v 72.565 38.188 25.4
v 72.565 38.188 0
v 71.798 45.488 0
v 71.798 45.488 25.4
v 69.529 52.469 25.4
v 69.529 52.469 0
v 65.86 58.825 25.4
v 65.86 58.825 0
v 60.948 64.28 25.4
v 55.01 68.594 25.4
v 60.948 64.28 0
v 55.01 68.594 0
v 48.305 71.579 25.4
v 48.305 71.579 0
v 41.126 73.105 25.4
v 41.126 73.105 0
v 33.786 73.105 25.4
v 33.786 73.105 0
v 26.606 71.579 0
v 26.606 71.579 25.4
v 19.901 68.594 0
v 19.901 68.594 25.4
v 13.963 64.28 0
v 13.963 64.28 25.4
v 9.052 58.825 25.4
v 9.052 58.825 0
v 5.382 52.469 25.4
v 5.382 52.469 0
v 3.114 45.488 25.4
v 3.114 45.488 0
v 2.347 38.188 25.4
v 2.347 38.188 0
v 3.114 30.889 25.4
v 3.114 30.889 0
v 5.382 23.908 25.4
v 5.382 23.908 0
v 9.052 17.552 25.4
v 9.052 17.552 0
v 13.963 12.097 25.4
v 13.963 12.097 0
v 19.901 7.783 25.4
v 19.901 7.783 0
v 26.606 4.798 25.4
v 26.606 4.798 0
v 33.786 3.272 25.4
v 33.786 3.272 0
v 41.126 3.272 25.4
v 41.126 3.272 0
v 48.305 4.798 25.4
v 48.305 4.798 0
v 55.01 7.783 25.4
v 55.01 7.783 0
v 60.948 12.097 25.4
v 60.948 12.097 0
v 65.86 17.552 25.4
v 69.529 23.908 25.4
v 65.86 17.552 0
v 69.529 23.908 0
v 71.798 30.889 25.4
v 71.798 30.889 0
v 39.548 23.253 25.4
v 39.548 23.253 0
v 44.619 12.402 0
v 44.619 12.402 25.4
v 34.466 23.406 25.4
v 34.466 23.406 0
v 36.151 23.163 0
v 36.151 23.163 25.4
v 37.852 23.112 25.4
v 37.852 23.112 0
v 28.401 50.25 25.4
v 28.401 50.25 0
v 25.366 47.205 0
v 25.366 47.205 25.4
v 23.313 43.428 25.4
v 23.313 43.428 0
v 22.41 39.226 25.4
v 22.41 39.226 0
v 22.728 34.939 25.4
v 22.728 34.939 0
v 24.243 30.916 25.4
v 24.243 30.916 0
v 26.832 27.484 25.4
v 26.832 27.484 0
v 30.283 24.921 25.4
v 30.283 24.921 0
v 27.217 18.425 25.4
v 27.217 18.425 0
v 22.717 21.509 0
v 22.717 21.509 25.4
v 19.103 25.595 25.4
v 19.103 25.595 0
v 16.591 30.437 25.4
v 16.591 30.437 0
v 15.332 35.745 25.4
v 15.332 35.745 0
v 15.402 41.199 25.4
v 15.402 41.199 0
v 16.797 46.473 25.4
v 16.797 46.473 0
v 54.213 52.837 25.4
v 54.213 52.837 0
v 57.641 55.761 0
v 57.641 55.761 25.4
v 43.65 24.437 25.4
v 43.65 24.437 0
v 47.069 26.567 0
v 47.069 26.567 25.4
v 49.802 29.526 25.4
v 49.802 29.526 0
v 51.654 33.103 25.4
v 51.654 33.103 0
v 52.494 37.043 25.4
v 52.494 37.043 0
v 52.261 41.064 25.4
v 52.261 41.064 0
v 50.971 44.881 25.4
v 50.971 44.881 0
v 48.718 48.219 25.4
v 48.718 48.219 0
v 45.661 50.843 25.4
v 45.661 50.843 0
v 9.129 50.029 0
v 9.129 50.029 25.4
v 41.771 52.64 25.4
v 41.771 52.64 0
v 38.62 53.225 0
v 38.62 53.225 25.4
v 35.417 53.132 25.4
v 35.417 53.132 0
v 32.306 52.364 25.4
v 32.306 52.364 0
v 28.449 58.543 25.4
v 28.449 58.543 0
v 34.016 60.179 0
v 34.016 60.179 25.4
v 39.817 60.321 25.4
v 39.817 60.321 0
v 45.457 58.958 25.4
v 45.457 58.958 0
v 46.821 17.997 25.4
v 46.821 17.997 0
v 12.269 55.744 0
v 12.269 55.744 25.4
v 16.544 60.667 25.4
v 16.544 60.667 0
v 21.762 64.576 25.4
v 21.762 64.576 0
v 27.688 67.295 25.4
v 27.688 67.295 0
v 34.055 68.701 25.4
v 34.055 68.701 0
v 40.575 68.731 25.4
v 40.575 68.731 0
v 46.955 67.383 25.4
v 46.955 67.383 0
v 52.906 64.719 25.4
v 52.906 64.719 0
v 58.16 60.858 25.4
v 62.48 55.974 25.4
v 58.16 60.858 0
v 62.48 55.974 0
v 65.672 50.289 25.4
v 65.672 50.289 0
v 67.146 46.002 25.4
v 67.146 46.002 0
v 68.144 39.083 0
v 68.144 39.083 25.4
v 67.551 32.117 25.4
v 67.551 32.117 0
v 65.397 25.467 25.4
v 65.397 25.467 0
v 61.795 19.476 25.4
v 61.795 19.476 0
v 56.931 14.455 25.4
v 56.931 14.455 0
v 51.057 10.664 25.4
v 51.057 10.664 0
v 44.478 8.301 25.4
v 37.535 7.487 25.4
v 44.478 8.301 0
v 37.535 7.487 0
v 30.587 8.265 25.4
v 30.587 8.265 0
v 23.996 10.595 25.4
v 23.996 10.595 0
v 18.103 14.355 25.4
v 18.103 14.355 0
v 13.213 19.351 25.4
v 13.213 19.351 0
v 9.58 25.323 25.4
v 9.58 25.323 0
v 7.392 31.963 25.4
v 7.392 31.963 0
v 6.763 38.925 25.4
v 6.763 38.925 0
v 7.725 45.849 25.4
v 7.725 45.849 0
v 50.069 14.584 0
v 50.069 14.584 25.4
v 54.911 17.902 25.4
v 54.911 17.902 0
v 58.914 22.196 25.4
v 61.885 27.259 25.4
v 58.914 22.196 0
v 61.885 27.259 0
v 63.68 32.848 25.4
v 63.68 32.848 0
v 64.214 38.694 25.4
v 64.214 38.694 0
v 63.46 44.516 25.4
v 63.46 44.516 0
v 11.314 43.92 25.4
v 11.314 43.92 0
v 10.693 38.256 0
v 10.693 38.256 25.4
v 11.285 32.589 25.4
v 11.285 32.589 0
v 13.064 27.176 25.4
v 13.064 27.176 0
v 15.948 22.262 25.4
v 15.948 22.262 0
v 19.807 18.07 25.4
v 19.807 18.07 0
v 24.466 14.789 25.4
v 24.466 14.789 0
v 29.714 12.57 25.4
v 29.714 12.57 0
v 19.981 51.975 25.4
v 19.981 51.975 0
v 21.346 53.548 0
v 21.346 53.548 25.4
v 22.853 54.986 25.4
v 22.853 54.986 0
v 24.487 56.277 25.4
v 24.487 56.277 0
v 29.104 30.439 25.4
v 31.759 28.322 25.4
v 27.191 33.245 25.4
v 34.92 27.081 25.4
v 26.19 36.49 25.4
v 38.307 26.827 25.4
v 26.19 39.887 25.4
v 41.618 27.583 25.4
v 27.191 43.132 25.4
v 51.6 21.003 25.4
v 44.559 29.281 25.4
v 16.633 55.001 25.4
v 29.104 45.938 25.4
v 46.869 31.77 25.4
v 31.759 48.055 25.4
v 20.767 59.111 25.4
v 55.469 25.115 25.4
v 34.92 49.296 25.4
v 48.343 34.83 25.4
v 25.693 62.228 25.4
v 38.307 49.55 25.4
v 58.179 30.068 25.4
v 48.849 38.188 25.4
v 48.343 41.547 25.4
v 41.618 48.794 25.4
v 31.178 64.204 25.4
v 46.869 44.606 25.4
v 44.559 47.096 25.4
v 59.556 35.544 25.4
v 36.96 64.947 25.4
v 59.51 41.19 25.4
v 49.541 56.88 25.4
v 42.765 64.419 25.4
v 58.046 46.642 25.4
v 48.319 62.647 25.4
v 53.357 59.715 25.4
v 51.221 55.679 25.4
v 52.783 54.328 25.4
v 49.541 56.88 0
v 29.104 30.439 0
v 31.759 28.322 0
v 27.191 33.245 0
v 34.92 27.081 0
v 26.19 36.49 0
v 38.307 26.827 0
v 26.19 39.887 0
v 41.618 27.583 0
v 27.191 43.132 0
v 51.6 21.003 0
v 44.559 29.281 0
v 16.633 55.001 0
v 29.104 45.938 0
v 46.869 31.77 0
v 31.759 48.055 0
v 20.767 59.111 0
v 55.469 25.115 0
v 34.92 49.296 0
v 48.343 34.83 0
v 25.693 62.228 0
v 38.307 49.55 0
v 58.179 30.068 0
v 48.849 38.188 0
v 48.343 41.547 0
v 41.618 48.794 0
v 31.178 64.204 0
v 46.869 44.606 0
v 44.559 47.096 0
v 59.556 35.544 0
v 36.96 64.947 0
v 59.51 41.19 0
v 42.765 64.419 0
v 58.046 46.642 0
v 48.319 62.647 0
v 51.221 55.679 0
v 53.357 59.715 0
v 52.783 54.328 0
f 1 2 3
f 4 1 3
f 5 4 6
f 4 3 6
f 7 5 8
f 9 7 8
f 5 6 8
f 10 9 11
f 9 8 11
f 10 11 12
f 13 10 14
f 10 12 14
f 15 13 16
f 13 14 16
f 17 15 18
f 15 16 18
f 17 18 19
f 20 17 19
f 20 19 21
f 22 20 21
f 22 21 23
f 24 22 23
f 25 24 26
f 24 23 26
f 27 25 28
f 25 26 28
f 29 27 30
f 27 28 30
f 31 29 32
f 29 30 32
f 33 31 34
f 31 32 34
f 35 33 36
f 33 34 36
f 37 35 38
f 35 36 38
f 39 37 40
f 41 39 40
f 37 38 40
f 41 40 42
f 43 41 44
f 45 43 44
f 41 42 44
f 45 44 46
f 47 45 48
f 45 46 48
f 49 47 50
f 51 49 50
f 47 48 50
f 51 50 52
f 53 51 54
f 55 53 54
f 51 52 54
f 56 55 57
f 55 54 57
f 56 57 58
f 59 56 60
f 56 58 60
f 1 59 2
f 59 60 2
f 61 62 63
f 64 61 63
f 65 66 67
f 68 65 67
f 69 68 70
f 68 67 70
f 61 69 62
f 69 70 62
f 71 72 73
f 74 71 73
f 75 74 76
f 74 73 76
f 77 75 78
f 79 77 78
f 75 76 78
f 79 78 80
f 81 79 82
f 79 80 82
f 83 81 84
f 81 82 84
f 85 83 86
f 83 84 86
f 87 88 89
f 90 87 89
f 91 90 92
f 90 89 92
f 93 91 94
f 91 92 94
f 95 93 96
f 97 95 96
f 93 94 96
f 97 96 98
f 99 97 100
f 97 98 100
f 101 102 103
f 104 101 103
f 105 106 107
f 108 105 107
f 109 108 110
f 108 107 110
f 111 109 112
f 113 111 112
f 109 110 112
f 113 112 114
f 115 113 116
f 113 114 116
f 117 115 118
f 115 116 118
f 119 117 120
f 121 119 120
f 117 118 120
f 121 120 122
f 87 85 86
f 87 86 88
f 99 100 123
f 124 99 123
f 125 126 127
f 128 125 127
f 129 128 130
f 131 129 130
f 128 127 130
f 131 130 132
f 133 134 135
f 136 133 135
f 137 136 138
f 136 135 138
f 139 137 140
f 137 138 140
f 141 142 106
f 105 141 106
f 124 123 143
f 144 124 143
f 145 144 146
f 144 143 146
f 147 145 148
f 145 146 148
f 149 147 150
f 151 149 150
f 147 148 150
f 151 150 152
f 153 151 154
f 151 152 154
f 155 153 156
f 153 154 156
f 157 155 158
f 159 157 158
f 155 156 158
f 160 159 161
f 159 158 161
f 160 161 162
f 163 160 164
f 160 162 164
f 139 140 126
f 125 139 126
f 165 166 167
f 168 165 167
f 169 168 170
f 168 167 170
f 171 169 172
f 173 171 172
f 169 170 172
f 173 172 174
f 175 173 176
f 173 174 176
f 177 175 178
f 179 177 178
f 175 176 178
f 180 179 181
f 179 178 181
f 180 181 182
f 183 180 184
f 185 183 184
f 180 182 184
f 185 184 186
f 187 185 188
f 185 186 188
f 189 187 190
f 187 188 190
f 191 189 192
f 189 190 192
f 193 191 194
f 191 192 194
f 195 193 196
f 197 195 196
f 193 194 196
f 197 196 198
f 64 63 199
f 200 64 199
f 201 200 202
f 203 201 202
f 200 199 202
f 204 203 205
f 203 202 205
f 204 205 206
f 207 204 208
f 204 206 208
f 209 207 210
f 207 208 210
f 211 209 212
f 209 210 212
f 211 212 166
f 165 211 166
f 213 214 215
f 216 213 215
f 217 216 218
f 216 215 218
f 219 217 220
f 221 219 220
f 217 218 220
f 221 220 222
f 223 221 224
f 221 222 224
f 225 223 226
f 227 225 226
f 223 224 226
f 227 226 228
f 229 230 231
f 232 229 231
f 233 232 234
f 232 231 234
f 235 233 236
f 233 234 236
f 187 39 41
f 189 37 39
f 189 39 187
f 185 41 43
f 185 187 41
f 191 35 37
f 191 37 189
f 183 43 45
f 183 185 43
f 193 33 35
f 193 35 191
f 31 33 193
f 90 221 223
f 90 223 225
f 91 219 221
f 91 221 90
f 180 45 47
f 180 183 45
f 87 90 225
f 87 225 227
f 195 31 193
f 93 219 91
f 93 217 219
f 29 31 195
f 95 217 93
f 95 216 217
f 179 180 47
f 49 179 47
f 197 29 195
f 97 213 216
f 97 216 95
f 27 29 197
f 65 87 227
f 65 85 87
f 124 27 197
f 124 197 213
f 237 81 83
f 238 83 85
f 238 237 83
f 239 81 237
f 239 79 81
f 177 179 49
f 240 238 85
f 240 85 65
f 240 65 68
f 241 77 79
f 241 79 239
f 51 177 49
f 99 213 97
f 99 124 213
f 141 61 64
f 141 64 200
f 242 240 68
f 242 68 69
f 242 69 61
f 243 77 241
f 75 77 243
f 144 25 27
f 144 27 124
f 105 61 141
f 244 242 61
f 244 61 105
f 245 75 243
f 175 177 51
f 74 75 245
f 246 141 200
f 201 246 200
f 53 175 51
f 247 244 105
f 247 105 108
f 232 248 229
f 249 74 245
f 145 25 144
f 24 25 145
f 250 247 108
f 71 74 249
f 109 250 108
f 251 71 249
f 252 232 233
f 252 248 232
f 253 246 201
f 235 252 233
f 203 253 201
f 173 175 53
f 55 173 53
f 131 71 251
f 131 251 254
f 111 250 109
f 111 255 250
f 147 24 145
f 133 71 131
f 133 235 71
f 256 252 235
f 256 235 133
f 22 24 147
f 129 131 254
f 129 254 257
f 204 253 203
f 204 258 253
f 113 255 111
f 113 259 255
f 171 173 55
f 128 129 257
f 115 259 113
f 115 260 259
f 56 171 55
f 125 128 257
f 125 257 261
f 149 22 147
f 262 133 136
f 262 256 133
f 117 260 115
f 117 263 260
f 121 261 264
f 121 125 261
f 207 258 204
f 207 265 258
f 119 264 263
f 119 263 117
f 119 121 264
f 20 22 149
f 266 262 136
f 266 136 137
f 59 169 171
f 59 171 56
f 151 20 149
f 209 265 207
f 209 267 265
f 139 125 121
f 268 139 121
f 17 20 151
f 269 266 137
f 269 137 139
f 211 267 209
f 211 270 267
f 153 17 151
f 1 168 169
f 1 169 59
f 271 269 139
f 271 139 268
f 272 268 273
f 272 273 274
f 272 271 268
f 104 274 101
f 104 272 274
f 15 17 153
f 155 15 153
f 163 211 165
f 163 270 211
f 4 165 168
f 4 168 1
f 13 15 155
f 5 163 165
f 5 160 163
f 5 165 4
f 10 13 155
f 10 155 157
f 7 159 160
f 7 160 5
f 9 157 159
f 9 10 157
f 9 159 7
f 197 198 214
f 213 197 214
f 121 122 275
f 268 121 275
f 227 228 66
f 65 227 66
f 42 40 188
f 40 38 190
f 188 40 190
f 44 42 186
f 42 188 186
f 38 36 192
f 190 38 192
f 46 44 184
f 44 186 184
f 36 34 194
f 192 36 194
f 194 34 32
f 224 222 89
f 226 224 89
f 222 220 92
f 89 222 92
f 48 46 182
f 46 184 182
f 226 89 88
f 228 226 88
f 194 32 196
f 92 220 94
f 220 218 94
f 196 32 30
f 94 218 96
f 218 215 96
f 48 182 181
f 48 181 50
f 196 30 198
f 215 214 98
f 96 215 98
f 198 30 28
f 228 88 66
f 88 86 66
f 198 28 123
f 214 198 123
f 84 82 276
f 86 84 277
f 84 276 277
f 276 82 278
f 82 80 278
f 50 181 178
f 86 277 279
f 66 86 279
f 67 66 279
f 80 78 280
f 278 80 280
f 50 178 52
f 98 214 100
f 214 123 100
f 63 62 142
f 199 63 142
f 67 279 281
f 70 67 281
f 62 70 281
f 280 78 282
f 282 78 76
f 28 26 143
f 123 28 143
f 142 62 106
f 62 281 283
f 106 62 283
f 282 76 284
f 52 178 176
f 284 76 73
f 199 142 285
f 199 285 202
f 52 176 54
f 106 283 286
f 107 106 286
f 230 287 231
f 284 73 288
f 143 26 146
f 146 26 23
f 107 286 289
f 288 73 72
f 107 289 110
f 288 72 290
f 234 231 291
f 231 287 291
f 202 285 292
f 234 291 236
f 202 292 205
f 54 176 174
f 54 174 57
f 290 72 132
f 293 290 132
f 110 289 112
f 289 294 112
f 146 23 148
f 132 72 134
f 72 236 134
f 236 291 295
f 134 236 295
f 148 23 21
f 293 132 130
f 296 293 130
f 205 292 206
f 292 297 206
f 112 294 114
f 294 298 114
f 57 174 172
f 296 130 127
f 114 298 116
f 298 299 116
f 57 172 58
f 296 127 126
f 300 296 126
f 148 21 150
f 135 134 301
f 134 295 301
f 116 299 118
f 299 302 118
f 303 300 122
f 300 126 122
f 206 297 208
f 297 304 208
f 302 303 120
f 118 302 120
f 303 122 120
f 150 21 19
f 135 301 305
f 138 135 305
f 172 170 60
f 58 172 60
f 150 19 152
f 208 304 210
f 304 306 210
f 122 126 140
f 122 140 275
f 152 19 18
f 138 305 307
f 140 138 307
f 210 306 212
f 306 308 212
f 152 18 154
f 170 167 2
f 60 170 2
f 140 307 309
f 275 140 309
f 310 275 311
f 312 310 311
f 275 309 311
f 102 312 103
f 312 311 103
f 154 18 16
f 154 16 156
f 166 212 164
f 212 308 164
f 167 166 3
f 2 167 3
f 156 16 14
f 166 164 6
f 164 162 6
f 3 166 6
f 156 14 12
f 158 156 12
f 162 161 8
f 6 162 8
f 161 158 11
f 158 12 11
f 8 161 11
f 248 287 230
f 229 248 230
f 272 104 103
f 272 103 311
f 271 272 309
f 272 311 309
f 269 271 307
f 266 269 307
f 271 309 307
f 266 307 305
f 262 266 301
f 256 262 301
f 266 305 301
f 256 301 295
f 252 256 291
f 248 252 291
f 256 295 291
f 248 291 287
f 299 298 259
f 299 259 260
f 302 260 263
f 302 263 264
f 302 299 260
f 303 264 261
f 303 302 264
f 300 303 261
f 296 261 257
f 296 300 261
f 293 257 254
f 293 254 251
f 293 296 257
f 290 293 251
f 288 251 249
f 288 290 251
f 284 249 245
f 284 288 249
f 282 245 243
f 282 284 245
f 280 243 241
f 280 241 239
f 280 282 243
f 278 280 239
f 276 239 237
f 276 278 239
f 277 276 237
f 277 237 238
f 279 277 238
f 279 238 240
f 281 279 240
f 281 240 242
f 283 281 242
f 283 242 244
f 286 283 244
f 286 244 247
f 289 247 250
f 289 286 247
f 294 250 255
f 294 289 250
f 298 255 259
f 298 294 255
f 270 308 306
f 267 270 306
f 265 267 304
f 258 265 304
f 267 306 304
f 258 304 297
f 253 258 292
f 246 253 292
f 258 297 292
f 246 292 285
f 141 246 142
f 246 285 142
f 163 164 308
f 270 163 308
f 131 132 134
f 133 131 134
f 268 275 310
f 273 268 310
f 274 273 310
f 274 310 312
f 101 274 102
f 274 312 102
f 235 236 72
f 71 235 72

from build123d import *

# Parameters (mm, degrees)
F0_R     = 35.1091
F0_R_2   = 11.393161
F1_DEPTH = 25.4


with BuildPart() as f1:
    # F0 (on Top) → F1 (new body)
    with BuildSketch(Plane.XY):
        with Locations((37.455708, 38.188457)):
            Circle(F0_R)
        with BuildLine():
            ThreePointArc((67.146141, 46.00208), (37.534716, 7.487183), (7.725452, 45.849163))
            Line((7.725452, 45.849163), (11.313939, 43.919829))
            ThreePointArc((11.313939, 43.919829), (14.374897, 24.641617), (29.714165, 12.569925))
            Line((29.714165, 12.569925), (34.466456, 23.405907))
            ThreePointArc((34.466456, 23.405907), (37.000848, 23.113561), (39.548255, 23.252572))
            Line((39.548255, 23.252572), (44.618947, 12.402246))
            ThreePointArc((44.618947, 12.402246), (60.539008, 24.645859), (63.459597, 44.516053))
            Line((63.459597, 44.516053), (67.146141, 46.00208))
        make_face(mode=Mode.SUBTRACT)
        with BuildLine():
            Line((46.820656, 17.996635), (43.649702, 24.437317))
            ThreePointArc((43.649702, 24.437317), (52.493895, 37.042883), (45.661202, 50.842677))
            Line((45.661202, 50.842677), (49.541016, 56.87956))
            ThreePointArc((49.541016, 56.87956), (52.018121, 55.021404), (54.213368, 52.837444))
            Line((54.213368, 52.837444), (57.641099, 55.760898))
            ThreePointArc((57.641099, 55.760898), (36.95968, 64.946534), (16.63291, 55.000709))
            Line((16.63291, 55.000709), (19.981425, 51.974734))
            ThreePointArc((19.981425, 51.974734), (22.082703, 54.284503), (24.486543, 56.27748))
            Line((24.486543, 56.27748), (28.400993, 50.249617))
            ThreePointArc((28.400993, 50.249617), (22.415419, 37.070808), (30.283139, 24.921443))
            Line((30.283139, 24.921443), (27.216956, 18.425362))
            ThreePointArc((27.216956, 18.425362), (16.591173, 30.437125), (16.797069, 46.472938))
            Line((16.797069, 46.472938), (9.129374, 50.028783))
            ThreePointArc((9.129374, 50.028783), (37.314565, 68.889509), (65.671979, 50.288727))
            Line((65.671979, 50.288727), (58.045574, 46.642415))
            ThreePointArc((58.045574, 46.642415), (58.179315, 30.067862), (46.820656, 17.996635))
        make_face(mode=Mode.SUBTRACT)
        with BuildLine():
            ThreePointArc((41.770592, 52.639796), (37.016011, 53.263804), (32.305881, 52.363742))
            Line((32.305881, 52.363742), (28.448893, 58.542554))
            ThreePointArc((28.448893, 58.542554), (36.911639, 60.439659), (45.456988, 58.958423))
            Line((45.456988, 58.958423), (41.770592, 52.639796))
        make_face(mode=Mode.SUBTRACT)
        with Locations((37.455708, 38.188457)):
            Circle(F0_R_2, mode=Mode.SUBTRACT)
    extrude(amount=F1_DEPTH)


solid = f1.part
